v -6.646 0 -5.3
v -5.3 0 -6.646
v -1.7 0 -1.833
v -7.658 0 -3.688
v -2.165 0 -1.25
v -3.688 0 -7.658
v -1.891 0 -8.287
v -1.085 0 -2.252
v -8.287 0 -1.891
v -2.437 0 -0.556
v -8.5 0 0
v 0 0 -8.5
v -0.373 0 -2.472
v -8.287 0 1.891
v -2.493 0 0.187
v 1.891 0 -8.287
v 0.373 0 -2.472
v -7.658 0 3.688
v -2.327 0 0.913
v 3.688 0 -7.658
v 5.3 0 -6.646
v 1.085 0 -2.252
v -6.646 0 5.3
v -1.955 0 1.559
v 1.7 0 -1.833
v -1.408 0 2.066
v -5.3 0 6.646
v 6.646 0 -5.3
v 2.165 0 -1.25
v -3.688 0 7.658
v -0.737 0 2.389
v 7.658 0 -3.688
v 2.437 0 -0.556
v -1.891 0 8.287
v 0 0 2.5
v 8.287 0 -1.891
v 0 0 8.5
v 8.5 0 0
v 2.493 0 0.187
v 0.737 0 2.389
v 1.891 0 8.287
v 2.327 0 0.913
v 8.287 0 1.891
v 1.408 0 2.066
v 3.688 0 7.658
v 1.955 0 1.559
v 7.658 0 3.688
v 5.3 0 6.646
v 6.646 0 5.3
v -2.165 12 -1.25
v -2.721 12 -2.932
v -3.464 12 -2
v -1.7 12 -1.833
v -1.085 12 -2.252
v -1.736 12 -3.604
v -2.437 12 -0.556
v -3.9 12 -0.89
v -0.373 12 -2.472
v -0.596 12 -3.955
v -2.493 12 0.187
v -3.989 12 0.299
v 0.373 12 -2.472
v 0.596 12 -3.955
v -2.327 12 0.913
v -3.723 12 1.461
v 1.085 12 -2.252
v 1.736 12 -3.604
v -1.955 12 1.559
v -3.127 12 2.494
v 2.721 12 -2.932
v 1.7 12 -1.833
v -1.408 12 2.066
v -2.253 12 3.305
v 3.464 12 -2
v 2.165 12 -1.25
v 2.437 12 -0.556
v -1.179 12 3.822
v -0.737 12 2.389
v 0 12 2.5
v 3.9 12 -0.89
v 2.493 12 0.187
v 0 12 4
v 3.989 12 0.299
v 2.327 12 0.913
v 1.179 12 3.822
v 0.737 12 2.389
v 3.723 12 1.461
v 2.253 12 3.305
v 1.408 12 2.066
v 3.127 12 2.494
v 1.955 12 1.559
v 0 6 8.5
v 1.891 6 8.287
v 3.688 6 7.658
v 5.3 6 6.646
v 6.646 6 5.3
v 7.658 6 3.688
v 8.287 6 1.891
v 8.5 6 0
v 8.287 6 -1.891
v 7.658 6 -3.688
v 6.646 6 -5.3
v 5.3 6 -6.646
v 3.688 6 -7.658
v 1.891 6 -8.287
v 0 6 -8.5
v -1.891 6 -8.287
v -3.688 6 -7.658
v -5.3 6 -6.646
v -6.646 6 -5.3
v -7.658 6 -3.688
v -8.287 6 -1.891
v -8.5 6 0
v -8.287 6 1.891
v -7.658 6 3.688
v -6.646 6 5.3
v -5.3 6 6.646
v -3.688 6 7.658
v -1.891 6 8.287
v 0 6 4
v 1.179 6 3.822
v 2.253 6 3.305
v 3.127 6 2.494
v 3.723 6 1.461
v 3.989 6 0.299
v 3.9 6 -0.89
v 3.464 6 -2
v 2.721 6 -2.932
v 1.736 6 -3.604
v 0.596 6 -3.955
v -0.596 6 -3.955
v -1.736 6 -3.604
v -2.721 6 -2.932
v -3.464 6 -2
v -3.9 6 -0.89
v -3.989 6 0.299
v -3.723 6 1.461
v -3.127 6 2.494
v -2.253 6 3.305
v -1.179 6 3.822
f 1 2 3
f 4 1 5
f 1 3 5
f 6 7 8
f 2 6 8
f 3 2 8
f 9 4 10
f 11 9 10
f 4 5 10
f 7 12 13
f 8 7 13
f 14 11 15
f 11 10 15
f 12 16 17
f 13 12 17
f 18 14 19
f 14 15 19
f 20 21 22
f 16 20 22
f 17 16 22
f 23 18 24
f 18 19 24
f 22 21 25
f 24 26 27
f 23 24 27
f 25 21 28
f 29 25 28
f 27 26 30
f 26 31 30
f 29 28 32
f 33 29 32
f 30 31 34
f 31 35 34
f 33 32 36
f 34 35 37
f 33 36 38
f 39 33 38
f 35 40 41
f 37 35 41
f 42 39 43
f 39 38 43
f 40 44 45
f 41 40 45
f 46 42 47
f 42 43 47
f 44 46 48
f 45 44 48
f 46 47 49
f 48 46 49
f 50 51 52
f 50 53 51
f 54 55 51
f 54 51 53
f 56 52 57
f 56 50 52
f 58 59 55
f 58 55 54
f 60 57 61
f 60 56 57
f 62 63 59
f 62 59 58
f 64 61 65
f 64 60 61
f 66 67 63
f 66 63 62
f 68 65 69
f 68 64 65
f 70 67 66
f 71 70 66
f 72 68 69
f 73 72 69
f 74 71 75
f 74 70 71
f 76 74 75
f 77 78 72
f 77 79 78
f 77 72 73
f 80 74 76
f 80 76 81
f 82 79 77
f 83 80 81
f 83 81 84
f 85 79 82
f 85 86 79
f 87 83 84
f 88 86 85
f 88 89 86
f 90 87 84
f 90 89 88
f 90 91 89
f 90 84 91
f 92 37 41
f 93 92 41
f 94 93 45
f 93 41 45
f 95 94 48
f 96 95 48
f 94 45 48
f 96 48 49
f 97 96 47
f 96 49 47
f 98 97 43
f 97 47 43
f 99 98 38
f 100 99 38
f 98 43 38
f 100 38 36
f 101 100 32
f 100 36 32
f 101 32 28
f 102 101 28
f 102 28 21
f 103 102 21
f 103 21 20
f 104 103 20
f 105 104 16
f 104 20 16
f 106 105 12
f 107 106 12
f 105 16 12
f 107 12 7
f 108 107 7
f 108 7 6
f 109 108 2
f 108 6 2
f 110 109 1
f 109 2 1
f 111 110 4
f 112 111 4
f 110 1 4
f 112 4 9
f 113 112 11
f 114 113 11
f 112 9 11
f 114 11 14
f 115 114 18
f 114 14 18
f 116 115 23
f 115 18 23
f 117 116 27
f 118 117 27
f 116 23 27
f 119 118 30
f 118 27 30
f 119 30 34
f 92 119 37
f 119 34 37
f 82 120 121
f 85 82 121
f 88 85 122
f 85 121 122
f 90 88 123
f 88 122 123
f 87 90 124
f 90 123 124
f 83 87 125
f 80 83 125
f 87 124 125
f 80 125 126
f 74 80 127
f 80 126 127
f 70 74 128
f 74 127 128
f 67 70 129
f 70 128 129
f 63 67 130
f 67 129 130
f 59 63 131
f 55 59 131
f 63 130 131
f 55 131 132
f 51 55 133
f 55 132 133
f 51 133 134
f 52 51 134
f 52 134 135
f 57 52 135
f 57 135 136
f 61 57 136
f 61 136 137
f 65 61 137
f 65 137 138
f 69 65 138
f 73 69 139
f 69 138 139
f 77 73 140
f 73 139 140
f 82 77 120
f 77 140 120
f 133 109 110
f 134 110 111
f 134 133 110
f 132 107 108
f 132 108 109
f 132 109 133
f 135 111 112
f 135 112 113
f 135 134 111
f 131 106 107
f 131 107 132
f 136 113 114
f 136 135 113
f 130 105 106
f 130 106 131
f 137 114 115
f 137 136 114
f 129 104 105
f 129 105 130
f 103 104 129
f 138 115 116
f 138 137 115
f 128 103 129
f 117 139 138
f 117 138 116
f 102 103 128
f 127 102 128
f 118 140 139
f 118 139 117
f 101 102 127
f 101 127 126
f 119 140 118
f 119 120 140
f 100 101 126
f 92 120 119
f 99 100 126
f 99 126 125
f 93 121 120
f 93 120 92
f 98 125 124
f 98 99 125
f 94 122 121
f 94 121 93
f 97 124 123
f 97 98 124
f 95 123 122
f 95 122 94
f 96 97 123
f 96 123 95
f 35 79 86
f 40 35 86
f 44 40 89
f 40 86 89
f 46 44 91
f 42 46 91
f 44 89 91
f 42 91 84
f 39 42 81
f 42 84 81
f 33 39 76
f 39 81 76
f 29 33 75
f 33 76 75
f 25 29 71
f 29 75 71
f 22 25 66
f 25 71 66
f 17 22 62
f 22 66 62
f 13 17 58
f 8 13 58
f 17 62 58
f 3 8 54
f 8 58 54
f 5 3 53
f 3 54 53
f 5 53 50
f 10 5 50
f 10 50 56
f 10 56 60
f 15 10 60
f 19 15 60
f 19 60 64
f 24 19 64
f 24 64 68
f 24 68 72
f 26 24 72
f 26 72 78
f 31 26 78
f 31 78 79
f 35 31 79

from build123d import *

# Parameters (mm, degrees)
ESQUISSE1_R             = 8.5
BOSS_EXTRU_1_DEPTH      = 6
ESQUISSE2_R             = 4
BOSS_EXTRU_2_DEPTH      = 6
ENL_V_MAT_EXTRU_1_REACH = 18.985
ESQUISSE3_R             = 2.5


with BuildPart() as part:
    # Esquisse1 → Boss.-Extru.1 (new body)
    with BuildSketch(Plane(origin=(0, 0, 0), x_dir=(1, 0, 0), z_dir=(0, 1, 0))):
        with Locations(Location((0, 0, 0), (0, 0, 270))):
            Circle(ESQUISSE1_R)
    extrude(amount=BOSS_EXTRU_1_DEPTH)

    # Esquisse2 → Boss.-Extru.2 (add)
    with BuildSketch(Plane(origin=(0, 6, 0), x_dir=(1, 0, 0), z_dir=(0, 1, 0))):
        with Locations(Location((0, 0, 0), (0, 0, 270))):
            Circle(ESQUISSE2_R)
    extrude(amount=BOSS_EXTRU_2_DEPTH)

    # Esquisse3 → Enlèv. mat.-Extru.1 (cut, up to next)
    with BuildSketch(Plane(origin=(0, 12, 0), x_dir=(1, 0, 0), z_dir=(0, 1, 0)), mode=Mode.PRIVATE) as enl_v_mat_extru_1_sk1:
        with Locations(Location((0, 0, 0), (0, 0, 270))):
            Circle(ESQUISSE3_R)
    enl_v_mat_extru_1_tool1 = extrude(enl_v_mat_extru_1_sk1.sketch, amount=-ENL_V_MAT_EXTRU_1_REACH, mode=Mode.PRIVATE) & part.part
    add(enl_v_mat_extru_1_tool1.solids().sort_by_distance((0, 12, 0))[0], mode=Mode.SUBTRACT)


solid = part.part
